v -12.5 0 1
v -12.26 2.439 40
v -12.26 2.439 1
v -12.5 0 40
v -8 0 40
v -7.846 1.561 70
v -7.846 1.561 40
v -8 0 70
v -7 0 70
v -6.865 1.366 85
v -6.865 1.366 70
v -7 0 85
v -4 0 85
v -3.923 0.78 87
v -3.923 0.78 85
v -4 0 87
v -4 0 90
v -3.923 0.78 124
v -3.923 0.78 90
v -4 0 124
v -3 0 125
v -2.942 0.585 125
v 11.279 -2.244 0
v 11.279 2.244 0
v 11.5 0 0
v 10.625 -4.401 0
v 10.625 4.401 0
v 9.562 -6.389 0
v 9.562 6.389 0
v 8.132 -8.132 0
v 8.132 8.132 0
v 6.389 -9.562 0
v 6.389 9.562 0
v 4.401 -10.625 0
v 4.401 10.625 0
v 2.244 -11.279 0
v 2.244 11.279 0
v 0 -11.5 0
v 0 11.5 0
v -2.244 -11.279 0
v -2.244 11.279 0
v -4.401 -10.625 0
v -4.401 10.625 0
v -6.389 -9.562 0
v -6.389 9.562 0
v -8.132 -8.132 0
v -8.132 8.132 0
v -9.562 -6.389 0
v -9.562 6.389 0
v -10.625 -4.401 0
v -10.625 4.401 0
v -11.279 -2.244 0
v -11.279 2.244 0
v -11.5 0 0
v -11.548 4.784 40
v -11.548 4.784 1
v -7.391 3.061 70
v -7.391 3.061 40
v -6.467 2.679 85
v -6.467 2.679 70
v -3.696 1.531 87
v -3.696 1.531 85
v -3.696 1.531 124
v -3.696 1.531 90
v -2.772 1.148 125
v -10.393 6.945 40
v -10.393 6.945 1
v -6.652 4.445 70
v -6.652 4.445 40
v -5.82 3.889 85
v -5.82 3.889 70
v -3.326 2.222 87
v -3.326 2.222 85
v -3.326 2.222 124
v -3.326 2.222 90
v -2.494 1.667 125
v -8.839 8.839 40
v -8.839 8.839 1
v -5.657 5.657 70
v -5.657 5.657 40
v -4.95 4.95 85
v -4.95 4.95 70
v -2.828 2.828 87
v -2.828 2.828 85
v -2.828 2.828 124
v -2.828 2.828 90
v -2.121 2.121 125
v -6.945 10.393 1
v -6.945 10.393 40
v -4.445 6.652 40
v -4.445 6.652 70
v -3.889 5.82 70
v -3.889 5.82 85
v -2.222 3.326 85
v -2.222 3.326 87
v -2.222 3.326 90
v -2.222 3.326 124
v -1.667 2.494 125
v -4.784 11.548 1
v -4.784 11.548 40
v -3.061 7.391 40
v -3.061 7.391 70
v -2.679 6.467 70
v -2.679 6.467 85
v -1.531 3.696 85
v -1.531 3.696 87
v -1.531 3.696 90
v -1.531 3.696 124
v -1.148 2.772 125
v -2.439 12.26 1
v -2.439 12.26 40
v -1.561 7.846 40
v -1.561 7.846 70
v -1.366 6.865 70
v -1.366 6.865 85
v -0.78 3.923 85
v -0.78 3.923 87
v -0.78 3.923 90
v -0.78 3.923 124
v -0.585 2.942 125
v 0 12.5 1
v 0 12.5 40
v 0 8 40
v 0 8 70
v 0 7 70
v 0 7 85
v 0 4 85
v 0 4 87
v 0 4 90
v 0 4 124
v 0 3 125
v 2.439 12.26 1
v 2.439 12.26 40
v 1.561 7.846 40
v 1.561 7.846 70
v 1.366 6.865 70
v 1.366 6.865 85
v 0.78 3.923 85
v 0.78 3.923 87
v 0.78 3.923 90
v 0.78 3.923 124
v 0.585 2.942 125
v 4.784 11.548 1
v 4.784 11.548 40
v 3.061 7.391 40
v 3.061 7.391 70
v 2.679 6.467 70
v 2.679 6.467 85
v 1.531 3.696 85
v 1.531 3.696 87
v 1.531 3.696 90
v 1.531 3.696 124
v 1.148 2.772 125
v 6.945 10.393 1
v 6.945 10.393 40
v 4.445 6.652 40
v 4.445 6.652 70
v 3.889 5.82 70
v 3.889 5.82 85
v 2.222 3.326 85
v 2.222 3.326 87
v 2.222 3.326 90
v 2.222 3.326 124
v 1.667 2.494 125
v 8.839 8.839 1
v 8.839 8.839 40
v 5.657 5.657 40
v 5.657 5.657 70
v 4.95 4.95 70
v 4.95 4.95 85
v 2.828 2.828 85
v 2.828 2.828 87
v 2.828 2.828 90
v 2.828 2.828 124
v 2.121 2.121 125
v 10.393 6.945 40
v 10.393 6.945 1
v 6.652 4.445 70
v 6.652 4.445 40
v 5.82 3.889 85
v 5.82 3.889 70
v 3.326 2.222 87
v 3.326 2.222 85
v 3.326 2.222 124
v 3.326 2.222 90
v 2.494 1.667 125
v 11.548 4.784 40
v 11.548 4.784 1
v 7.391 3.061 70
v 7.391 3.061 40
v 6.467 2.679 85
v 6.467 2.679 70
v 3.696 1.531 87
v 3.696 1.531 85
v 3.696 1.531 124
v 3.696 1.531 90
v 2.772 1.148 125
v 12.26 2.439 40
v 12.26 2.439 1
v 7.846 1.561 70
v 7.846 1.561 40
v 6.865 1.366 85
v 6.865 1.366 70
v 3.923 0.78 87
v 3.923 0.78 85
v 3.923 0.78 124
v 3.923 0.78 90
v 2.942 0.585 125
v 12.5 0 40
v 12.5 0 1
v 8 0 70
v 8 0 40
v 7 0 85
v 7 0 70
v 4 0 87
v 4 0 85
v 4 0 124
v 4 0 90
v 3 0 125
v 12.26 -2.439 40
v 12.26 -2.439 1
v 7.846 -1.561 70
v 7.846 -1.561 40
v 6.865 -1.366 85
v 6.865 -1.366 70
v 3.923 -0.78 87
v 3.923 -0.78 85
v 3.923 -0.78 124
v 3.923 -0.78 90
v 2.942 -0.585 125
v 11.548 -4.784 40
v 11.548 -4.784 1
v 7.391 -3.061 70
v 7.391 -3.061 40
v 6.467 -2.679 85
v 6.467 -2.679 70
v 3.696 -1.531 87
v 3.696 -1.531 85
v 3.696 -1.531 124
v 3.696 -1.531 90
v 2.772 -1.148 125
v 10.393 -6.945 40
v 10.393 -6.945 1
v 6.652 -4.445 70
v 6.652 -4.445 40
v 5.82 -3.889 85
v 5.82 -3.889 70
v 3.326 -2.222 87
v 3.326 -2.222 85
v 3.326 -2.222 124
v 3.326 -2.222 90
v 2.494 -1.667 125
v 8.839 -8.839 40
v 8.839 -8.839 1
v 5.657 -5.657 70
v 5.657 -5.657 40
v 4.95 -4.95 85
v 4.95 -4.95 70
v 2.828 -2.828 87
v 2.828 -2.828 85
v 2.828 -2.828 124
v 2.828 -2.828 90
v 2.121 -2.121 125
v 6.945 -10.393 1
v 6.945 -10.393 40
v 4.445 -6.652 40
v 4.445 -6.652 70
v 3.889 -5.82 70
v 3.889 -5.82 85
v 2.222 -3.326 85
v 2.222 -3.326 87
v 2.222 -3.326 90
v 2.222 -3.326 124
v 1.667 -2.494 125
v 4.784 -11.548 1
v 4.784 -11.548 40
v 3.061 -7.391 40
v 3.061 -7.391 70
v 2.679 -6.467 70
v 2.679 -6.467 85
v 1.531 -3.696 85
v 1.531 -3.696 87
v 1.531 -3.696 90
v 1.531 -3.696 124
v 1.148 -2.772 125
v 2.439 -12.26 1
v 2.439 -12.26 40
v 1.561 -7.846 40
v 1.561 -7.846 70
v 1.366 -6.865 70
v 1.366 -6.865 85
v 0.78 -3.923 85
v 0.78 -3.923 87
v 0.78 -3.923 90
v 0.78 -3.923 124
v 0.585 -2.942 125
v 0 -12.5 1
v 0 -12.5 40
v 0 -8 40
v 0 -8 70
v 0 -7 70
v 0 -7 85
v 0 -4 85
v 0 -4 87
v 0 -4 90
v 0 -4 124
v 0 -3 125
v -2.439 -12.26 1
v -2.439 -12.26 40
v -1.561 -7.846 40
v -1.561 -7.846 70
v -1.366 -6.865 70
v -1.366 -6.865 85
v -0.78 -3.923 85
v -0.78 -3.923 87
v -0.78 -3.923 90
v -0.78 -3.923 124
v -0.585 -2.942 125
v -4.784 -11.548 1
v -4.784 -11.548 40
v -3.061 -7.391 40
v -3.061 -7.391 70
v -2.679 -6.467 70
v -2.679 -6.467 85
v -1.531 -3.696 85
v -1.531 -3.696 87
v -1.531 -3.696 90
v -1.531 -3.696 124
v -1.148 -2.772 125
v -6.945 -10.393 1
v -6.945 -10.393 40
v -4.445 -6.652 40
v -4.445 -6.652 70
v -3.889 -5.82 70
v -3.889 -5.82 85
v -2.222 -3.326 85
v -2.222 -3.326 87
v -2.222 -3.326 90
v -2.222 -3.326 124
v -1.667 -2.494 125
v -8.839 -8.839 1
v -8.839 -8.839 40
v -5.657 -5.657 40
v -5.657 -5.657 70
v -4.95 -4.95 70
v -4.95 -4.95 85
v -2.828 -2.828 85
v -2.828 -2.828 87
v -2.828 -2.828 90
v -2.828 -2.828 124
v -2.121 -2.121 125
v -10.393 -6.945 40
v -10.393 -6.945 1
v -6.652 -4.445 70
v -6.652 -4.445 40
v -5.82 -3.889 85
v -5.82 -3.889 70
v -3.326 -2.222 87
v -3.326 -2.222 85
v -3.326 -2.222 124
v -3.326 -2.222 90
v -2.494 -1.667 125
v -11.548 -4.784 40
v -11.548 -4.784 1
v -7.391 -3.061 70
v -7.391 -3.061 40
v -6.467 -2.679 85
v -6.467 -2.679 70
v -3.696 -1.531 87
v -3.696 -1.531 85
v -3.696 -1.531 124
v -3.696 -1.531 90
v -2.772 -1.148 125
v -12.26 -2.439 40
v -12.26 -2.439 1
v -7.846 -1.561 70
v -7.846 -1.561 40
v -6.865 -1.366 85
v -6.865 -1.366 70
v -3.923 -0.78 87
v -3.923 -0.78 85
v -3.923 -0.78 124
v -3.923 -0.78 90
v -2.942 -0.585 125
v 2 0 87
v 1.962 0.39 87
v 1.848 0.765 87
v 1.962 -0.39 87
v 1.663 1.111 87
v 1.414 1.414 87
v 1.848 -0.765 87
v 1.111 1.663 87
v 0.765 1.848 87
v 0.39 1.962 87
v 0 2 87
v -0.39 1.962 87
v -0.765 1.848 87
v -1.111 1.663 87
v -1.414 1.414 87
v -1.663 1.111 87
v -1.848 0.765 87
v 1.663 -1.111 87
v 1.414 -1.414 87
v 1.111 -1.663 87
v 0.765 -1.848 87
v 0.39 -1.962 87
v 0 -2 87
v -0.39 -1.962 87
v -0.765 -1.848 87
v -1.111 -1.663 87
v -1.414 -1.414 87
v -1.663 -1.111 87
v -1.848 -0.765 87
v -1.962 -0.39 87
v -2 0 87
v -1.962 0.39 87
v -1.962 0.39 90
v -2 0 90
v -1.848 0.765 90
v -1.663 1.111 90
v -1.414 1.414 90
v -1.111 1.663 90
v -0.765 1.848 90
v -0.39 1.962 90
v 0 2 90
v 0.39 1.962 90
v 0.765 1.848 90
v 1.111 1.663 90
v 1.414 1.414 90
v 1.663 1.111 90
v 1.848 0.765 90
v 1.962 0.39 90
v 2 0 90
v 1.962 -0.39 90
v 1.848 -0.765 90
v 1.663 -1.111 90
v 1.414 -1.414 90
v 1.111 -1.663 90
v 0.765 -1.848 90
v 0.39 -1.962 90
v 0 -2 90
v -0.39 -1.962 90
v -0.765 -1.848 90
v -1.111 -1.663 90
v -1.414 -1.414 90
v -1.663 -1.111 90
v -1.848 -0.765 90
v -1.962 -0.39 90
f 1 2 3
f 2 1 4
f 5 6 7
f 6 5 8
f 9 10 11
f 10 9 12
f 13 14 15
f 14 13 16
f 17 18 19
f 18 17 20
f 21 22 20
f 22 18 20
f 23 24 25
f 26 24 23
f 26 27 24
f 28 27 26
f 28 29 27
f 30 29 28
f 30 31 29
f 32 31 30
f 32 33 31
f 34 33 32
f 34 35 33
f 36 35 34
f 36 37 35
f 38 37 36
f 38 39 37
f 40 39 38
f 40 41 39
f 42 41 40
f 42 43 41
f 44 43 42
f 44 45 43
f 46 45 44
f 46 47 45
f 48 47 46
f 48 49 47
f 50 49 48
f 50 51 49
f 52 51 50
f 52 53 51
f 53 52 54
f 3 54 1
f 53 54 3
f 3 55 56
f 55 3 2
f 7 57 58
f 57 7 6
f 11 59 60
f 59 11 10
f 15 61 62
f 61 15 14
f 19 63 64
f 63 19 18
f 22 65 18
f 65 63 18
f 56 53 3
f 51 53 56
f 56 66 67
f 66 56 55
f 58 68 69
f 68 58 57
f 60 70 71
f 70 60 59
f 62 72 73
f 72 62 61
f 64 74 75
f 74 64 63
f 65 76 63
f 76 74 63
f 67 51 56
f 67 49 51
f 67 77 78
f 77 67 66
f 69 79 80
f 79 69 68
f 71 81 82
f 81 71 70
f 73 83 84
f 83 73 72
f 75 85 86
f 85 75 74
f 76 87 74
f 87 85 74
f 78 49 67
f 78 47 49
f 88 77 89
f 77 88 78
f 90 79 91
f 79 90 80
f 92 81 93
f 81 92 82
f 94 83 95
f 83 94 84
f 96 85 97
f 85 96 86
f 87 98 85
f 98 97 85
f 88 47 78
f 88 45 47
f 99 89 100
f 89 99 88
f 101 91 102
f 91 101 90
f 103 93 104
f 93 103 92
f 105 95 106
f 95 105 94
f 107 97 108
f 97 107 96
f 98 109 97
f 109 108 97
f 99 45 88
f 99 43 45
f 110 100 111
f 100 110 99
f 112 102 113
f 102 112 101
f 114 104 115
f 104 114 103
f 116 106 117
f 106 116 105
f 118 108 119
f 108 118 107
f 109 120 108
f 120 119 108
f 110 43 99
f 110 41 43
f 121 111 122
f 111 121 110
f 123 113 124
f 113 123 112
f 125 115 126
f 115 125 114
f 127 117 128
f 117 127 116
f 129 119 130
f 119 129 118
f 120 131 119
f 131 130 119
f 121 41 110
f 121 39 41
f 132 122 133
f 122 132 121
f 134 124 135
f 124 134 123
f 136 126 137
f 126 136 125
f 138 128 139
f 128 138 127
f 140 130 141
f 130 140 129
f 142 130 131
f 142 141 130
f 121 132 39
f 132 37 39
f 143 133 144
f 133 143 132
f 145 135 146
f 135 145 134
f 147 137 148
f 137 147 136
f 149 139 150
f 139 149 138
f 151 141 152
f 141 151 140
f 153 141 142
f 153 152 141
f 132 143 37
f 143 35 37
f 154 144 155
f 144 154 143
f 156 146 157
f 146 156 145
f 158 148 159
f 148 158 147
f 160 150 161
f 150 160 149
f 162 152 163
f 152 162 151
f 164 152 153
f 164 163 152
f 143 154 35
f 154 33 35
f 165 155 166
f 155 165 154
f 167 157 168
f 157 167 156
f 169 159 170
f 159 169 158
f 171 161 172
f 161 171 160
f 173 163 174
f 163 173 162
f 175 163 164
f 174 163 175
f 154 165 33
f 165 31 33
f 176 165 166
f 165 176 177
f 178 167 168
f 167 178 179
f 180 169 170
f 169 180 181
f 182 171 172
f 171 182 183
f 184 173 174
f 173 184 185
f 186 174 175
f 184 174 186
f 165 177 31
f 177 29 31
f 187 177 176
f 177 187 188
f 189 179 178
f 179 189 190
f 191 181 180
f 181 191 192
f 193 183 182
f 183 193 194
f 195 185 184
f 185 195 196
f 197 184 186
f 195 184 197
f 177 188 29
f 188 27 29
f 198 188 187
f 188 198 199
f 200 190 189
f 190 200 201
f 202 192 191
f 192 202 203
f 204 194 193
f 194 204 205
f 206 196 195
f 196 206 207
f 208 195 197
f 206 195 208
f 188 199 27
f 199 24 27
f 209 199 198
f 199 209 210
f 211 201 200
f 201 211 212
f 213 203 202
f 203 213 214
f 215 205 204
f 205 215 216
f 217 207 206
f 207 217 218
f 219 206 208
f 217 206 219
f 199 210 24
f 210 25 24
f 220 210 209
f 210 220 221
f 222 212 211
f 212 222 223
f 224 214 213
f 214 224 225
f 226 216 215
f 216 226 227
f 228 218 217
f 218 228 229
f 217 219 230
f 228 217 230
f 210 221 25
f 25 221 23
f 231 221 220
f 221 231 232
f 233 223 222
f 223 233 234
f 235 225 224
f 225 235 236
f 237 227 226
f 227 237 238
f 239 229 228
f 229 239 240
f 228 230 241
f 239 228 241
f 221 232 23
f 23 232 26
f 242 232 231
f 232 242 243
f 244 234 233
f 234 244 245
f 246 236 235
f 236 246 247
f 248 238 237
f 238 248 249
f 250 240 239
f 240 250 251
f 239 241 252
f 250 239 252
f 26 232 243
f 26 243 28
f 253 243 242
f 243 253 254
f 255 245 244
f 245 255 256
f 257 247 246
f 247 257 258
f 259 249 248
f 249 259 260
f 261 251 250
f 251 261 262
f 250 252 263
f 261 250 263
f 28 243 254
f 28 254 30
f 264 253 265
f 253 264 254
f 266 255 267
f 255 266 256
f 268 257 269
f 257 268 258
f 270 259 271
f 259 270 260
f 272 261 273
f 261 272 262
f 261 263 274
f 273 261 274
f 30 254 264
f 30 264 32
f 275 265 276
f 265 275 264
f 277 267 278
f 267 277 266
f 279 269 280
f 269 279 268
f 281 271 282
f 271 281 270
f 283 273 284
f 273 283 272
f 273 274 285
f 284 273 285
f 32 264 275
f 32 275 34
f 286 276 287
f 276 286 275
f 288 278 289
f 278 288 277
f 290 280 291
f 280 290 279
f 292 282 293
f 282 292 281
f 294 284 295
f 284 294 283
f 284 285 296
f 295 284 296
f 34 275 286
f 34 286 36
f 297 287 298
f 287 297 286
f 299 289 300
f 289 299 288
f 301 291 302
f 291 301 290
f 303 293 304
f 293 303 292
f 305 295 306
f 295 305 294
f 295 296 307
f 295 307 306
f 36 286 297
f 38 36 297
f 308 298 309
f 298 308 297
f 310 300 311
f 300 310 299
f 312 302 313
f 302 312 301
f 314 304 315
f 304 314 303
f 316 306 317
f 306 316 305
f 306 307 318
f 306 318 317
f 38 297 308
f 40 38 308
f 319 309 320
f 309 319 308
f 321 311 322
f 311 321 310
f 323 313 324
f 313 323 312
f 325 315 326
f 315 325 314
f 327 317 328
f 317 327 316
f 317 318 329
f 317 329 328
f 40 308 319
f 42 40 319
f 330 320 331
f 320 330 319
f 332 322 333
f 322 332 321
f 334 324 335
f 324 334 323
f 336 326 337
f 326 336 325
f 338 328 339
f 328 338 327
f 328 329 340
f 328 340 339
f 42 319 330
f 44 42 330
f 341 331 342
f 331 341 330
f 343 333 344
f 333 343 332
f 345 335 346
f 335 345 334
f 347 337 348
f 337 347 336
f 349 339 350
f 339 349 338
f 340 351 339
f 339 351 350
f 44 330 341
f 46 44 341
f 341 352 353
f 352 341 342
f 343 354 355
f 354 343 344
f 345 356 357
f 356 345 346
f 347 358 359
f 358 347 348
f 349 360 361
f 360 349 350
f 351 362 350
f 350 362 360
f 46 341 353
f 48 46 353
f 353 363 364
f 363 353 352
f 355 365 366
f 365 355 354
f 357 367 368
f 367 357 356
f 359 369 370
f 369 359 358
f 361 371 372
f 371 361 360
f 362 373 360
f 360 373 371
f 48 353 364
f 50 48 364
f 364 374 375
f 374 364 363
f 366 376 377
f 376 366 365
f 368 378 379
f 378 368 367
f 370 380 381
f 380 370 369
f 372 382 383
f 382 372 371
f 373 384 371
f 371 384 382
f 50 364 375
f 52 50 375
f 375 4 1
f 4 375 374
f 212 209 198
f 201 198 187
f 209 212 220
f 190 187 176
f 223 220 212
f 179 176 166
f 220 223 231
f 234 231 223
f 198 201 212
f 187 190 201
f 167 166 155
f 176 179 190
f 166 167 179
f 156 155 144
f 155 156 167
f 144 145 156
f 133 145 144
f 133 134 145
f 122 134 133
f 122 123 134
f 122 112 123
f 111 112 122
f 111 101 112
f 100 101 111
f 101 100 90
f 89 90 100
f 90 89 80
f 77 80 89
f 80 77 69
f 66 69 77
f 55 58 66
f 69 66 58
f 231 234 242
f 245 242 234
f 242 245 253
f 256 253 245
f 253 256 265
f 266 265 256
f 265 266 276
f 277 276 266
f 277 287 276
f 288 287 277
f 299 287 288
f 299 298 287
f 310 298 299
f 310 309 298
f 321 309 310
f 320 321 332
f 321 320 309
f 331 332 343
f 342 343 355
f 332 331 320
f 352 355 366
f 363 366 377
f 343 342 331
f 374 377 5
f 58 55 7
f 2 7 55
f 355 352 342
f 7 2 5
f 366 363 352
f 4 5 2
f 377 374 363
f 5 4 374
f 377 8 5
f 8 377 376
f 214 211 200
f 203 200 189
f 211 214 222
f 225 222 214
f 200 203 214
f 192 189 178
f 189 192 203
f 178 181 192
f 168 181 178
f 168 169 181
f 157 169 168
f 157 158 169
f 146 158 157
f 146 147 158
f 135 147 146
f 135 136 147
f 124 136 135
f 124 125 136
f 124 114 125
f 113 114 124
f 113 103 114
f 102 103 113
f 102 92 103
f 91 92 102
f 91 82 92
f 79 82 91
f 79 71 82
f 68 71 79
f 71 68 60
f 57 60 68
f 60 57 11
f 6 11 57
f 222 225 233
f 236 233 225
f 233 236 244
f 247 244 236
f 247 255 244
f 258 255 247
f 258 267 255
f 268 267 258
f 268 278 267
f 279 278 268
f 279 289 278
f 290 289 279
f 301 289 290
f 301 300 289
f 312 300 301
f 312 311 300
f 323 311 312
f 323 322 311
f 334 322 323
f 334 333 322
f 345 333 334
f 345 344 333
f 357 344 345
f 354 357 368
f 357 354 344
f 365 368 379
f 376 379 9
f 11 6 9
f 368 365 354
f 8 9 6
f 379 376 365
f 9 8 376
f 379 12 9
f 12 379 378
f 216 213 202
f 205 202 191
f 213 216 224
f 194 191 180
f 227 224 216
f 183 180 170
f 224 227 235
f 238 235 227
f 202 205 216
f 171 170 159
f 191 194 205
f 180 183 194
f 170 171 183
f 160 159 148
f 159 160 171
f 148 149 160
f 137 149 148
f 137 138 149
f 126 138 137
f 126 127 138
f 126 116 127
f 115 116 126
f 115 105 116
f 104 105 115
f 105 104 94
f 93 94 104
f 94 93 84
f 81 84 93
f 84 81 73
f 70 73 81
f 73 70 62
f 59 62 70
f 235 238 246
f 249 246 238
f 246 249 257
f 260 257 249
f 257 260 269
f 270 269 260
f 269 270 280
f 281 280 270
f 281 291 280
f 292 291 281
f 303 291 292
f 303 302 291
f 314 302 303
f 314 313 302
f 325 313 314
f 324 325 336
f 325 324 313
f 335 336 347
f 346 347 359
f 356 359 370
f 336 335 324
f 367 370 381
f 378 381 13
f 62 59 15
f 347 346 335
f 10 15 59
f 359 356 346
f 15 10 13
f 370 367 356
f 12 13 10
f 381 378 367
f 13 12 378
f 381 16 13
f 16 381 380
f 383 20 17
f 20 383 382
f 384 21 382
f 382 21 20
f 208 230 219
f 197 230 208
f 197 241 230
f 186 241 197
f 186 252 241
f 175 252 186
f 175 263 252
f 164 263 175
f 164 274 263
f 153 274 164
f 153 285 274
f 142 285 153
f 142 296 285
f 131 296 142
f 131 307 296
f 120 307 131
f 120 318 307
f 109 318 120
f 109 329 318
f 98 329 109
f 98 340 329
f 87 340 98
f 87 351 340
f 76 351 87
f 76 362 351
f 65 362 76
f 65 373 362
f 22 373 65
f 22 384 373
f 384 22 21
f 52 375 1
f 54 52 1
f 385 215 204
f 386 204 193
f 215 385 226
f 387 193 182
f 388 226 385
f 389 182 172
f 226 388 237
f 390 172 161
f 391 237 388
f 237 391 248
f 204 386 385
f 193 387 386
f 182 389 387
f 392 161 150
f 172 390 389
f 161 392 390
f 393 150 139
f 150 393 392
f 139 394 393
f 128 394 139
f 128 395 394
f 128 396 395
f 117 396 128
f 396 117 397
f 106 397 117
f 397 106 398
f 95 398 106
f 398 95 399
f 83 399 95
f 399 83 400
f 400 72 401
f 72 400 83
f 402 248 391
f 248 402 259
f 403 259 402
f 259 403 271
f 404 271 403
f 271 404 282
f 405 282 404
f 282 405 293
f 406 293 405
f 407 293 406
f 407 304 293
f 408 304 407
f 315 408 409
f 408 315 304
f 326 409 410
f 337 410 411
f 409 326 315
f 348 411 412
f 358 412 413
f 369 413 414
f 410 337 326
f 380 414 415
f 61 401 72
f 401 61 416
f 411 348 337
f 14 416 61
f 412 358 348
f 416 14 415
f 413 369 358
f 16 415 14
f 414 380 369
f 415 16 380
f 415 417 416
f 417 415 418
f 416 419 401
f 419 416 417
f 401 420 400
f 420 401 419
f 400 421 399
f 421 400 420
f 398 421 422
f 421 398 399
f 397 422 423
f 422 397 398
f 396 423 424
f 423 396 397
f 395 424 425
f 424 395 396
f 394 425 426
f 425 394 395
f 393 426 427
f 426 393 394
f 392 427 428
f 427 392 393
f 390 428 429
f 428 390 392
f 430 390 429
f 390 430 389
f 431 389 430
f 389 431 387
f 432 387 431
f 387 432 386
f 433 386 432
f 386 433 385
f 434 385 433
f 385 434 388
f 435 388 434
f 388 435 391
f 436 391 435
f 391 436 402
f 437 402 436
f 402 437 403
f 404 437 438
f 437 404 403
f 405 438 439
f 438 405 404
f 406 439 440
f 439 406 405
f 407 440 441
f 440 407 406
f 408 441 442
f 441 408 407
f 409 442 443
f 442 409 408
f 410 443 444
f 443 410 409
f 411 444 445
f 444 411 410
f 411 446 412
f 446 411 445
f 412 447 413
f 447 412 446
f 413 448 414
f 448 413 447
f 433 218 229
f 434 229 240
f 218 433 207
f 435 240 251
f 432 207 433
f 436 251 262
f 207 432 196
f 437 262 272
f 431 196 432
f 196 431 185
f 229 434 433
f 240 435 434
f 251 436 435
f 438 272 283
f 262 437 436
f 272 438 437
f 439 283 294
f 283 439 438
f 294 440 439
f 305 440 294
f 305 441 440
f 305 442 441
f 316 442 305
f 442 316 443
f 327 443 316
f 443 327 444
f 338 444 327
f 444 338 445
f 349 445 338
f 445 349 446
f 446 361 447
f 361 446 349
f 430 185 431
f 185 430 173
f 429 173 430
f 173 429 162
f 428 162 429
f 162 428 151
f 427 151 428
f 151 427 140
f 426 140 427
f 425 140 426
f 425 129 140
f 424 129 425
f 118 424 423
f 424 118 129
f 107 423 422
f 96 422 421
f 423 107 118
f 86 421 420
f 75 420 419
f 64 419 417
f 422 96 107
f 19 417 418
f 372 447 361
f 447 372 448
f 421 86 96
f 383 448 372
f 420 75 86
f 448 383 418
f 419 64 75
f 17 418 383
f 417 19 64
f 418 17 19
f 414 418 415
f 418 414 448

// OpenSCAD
$fn = 32;

// ----------------------------------------------------------------------
// Stepped shaft: diameters 25, 16, 14, 8 mm, 125 mm long
// ----------------------------------------------------------------------

// --- parameters (mm) ---
d1 = 25;                  // step 1 diameter
len1 = 40;                // step 1 length
d2 = 16;                  // step 2 diameter
len2 = 30;                // step 2 length
d3 = 14;                  // step 3 diameter
len3 = 15;                // step 3 length
d4 = 8;                   // step 4 diameter
len4 = 40;                // step 4 length
total = 125;              // overall length
chamfer = 1;              // end chamfer
groove_r = 4;             // groove radius
groove_z = 87;            // groove position from the end
groove_w = 3;             // groove width
groove_d = 2;             // groove depth
key_w = 6;                // keyway width
key_d = 3;                // keyway depth
key_len = 34;             // keyway length
key_z = 88;               // keyway start along the shaft

/* closed turning profile: x is the radius, y is the length */
profile = [[0, 0], [12.5 - chamfer, 0], [12.5, chamfer], [12.5, 40], [8, 40], [8, 70], [7, 70], [7, 85], [4, 85], [4, 124], [3, 125], [0, 125]];

difference() {
  rotate_extrude() polygon(profile);
  /* circlip groove just behind the shoulder */
  rotate_extrude() translate([groove_r - groove_d, groove_z]) square([groove_d + 1, groove_w]);
  /* keyway milled into the top of the largest step */
  translate([d1 / 2 - key_d, -key_w / 2, key_z]) cube([key_d + 1, key_w, key_len]);
}
